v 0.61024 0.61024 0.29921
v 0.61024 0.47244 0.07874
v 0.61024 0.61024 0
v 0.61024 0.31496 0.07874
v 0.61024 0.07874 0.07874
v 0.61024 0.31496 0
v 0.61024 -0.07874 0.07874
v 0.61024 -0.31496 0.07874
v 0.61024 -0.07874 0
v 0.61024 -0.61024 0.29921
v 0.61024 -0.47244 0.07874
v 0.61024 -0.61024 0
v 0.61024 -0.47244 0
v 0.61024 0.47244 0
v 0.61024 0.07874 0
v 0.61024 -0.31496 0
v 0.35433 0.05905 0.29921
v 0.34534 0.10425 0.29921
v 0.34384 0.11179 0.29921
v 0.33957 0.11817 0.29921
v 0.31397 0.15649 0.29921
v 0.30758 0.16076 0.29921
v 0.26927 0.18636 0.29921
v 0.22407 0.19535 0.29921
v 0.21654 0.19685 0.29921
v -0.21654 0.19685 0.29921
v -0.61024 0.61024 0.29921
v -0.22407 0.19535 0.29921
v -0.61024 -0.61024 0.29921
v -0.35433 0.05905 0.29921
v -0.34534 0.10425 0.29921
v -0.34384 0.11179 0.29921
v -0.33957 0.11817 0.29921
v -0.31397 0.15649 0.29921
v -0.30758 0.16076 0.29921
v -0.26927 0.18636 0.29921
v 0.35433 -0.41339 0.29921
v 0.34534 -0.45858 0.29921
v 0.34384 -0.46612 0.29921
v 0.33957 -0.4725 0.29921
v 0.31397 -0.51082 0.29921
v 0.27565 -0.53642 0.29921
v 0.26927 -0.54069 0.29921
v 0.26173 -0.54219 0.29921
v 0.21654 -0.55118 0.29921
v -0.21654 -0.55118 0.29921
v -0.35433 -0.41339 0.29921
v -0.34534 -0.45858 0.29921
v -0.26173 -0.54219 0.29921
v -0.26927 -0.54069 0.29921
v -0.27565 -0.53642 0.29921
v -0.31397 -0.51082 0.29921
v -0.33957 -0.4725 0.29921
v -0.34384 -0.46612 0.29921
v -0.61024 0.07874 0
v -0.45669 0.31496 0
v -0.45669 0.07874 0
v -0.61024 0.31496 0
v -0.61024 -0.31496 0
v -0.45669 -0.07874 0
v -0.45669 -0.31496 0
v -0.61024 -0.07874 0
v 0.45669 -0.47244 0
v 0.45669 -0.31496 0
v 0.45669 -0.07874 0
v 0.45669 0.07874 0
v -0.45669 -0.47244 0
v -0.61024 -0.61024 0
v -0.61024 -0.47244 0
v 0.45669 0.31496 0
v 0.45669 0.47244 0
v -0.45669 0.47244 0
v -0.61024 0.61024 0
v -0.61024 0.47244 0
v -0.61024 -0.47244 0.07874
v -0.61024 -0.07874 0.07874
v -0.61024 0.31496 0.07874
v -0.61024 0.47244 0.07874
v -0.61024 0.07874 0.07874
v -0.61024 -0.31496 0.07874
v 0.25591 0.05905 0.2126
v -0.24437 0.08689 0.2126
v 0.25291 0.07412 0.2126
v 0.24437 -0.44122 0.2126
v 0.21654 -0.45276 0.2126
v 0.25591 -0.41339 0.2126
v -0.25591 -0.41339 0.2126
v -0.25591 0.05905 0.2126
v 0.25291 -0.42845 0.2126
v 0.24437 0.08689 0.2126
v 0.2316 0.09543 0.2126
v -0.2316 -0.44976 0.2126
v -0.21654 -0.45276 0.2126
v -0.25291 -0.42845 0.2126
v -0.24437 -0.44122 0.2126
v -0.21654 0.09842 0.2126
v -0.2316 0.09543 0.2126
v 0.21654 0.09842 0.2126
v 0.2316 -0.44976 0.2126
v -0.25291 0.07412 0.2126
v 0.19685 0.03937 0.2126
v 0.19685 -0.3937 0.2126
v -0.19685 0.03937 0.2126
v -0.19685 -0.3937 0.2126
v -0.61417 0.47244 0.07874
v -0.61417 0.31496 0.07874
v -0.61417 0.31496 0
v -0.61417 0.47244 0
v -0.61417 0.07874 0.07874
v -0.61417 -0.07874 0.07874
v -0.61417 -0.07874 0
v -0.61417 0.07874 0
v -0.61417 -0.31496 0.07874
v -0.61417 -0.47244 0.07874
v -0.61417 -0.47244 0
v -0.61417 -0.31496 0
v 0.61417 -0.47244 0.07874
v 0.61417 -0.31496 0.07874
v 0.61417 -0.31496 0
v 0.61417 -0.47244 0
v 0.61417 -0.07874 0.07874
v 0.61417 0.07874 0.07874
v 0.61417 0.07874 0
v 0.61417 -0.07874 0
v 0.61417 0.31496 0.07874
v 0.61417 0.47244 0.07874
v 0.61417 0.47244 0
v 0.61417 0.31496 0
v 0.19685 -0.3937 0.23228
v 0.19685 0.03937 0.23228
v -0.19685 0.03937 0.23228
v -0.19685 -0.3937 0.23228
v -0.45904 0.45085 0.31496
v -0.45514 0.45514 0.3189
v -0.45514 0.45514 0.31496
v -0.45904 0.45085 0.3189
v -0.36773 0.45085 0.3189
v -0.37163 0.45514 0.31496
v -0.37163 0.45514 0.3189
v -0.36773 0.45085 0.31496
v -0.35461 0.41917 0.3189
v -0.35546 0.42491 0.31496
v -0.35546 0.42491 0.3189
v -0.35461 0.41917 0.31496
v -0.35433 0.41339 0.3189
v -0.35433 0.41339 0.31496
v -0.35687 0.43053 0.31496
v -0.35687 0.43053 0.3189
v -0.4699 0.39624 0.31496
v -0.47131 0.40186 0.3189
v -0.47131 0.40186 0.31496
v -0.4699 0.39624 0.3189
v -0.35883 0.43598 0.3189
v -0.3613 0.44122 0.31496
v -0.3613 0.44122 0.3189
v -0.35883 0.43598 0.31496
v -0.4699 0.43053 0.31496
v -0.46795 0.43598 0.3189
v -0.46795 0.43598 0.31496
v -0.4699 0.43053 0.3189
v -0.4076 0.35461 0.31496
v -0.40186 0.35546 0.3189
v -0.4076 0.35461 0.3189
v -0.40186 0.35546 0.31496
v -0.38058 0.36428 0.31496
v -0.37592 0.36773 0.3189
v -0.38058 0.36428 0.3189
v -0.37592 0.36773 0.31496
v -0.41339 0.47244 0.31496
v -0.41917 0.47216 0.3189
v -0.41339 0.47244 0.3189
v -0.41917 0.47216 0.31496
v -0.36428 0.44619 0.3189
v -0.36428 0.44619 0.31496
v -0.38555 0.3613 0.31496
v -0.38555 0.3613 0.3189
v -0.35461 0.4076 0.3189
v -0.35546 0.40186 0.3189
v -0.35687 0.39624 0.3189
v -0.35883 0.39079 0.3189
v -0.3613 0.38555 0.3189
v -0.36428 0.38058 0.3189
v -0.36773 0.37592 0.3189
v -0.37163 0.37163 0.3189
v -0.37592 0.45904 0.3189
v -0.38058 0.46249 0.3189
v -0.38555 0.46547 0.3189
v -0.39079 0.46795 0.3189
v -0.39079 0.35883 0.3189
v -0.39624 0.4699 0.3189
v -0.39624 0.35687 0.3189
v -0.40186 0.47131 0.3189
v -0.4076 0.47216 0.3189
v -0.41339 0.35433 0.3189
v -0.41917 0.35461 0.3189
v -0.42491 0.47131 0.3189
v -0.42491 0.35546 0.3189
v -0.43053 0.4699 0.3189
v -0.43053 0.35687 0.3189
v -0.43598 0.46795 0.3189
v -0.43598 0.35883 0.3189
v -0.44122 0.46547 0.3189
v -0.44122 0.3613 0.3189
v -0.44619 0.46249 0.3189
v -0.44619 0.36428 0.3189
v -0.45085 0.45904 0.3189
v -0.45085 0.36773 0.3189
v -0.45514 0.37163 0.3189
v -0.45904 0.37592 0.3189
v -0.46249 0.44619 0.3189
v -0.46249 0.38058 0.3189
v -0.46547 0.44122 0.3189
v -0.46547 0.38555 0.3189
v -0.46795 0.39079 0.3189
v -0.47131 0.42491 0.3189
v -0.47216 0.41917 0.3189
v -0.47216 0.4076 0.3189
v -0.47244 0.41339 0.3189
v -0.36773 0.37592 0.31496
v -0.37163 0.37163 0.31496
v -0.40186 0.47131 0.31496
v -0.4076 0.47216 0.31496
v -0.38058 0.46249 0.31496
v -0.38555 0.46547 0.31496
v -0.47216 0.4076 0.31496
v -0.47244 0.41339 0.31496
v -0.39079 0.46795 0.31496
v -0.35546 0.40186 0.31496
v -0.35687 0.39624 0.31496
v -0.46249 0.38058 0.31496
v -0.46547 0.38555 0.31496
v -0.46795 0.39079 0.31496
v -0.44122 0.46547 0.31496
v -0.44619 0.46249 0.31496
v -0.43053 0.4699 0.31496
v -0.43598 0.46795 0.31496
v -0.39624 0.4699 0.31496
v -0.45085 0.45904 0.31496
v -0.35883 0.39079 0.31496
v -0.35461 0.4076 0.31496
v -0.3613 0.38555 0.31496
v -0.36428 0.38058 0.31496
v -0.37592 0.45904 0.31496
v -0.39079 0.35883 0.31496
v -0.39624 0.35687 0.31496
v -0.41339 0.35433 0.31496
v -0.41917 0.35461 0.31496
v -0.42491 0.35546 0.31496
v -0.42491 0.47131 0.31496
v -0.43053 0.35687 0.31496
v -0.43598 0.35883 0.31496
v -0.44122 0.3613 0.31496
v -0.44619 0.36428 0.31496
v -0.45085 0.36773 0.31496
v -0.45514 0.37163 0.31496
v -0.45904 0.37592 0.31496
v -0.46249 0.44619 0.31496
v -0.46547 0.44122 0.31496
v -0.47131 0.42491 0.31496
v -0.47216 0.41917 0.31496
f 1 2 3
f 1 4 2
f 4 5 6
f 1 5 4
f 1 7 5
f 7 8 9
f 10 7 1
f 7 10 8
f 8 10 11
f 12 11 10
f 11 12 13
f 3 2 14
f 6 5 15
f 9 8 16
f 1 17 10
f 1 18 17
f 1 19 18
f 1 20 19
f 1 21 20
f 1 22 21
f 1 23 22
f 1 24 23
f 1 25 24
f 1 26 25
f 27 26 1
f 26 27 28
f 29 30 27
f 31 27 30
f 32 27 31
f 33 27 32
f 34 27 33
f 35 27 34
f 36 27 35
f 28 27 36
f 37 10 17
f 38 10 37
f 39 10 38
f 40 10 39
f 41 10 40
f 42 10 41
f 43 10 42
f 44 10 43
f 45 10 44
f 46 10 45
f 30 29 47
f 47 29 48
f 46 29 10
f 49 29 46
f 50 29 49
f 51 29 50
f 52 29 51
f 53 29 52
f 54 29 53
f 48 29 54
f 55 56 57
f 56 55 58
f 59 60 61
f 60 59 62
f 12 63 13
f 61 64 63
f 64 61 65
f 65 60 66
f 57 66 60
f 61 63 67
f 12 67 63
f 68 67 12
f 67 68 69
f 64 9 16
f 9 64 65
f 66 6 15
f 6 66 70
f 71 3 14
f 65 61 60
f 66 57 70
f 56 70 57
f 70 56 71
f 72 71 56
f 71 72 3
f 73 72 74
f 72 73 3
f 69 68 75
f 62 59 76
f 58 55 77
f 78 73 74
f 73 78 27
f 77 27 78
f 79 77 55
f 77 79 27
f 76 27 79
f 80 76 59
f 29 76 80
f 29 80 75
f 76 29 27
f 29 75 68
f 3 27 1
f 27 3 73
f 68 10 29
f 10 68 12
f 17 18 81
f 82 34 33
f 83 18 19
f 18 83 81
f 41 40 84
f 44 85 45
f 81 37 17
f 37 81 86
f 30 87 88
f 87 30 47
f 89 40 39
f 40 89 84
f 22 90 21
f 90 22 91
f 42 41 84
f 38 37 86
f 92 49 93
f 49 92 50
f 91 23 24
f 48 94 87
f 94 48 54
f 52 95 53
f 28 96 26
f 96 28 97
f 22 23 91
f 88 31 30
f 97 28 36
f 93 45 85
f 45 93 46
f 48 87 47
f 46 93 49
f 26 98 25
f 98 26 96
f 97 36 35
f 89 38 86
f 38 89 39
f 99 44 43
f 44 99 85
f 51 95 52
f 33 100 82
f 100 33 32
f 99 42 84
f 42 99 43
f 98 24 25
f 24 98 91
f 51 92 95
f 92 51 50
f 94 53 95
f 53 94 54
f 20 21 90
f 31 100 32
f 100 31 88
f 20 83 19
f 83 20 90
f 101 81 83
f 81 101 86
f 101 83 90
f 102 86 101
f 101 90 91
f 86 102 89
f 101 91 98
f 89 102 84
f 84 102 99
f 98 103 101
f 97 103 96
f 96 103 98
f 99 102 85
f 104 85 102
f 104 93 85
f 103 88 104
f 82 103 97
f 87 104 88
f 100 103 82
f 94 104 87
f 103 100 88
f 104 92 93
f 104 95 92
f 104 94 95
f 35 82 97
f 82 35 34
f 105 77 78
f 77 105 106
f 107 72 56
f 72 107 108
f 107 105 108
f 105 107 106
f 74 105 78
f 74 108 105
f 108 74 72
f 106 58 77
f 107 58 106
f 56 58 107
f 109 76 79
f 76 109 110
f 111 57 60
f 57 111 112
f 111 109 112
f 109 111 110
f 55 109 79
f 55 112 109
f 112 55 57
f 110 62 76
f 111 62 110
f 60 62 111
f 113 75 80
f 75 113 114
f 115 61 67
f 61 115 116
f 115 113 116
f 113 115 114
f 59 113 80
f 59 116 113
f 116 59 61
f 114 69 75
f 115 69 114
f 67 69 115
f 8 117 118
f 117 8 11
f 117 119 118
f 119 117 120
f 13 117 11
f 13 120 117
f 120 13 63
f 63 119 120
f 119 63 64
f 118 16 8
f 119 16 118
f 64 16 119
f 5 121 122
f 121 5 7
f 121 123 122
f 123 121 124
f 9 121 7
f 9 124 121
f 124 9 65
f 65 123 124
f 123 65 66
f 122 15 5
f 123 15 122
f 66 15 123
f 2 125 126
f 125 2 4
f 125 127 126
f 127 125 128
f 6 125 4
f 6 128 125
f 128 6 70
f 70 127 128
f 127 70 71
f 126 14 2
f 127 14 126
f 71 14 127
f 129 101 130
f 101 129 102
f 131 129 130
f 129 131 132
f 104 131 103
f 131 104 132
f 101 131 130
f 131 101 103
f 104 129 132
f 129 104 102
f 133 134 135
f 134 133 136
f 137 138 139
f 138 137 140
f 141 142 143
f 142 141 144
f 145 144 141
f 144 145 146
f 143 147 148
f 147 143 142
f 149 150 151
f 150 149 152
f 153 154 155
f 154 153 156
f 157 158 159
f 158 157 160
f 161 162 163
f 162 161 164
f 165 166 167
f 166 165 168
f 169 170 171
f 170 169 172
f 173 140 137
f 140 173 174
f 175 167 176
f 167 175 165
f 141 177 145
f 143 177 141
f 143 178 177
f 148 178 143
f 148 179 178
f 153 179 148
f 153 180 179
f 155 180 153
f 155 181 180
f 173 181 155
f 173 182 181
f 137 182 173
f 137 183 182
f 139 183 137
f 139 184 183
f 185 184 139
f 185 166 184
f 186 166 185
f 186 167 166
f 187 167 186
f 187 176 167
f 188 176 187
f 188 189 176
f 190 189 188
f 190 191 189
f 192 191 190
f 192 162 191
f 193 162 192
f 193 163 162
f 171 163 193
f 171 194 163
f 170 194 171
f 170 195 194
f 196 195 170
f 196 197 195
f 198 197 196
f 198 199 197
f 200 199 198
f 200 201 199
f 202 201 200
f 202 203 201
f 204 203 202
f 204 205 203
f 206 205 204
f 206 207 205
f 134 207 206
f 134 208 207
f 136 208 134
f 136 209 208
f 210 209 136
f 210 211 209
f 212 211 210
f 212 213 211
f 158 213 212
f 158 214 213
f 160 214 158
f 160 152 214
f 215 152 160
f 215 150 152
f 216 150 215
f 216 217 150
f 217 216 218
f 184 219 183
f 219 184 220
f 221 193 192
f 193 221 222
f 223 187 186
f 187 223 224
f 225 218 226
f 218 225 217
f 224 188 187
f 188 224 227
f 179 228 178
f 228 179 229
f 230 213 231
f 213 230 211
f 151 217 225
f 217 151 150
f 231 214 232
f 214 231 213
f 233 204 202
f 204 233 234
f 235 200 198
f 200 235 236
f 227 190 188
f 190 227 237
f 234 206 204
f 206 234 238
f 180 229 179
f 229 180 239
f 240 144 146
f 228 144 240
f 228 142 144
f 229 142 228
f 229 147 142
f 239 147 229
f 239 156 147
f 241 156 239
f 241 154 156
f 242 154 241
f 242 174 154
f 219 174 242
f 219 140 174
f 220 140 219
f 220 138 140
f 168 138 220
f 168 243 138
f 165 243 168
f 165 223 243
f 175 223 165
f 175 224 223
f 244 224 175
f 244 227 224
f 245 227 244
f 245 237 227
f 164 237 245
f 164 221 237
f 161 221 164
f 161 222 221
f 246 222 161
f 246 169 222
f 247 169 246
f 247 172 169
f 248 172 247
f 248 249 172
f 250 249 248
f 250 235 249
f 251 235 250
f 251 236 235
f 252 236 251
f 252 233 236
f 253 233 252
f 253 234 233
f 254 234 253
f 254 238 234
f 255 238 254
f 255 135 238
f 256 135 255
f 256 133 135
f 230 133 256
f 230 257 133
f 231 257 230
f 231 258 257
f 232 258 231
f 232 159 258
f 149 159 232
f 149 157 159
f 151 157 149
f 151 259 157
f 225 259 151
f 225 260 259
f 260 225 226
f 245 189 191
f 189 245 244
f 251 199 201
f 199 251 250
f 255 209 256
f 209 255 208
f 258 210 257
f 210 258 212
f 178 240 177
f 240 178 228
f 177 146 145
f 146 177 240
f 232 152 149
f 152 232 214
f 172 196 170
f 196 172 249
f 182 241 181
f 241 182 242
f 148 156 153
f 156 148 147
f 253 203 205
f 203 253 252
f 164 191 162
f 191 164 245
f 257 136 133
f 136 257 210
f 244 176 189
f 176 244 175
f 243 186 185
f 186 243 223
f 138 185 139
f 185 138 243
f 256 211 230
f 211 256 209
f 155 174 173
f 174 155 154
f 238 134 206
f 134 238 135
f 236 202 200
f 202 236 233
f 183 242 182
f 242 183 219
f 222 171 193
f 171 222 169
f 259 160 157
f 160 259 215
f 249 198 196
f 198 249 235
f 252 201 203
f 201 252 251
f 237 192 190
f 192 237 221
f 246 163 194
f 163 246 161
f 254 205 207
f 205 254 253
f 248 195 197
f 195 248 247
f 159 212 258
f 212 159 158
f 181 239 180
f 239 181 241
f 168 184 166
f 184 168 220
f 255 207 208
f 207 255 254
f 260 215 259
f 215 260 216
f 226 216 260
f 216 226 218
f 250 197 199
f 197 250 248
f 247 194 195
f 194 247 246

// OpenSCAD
// file: defines.scad
L = 3.1;  // Длина
W = 3.1;  // Ширина
H = 0.8;  // Высота (от платы, с выводами)
Hf = 0.04;  // Возвышение над платой (высота выводов)
e = 0.5;    // Шаг выводов

pin_fragments = 16;

scale = 1/2.54;
// file: HDC1080DM-pins.scad
include <defines.scad>

p_w = 0.567;
p_h = 0.4;

p_co = 1.55 - 3*p_h/2 + 0.02;

module Pin(x, y, z, r) {
color("Gold")
  rotate([0,0,r]) translate([x,y,z])
  union() {
    /*Упрощенный вид ног*/
    /*cube(size = [p_w, p_h, Hf],center=true);*/
    /*Оригинальная форма*/
    /*translate([-0.04,0,0.0]) cube(size = [0.4, 0.3, Hf], center=true);
    translate([ 0.14,0,0.0]) cylinder(r = p_h/2, h = Hf, $fn = 64, center=true);
    translate([-0.23,0.1,0.0]) cylinder(r = 0.05, h = Hf, $fn = 64, center=true);
    translate([-0.23,-0.1,0.0]) cylinder(r = 0.05, h = Hf, $fn = 64, center=true);
    translate([-0.23,0,0]) cube(size = [0.1, 0.2, Hf],center=true);*/

    translate([-0.39, 0, 0.1]) cube(size = [p_h, p_h, 0.2],center=true); // На боковине
  }
}

scale(scale)
  union() {
    Pin(-p_co, 1.0, 0, 0); // #1
    Pin(-p_co, 0.0, 0, 0); // #2
    Pin(-p_co,-1.0, 0, 0); // #3

    /*Pin(-p_co, 0.5, 0, 90); // #6
    Pin(-p_co, 0.0, 0, 90); // #7
    Pin(-p_co,-0.5, 0, 90); // #8*/

    Pin(-p_co, 1.0, 0, 180); // #4
    Pin(-p_co, 0.0, 0, 180); // #5
    Pin(-p_co,-1.0, 0, 180); // #6

    /*Pin(-p_co, 0.5, 0, 270); // #14
    Pin(-p_co, 0.0, 0, 270); // #15
    Pin(-p_co,-0.5, 0, 270); // #16*/

  };
// file: HDC1080DM-label.scad
include <defines.scad>

font = "Liberation Sans";
/*font = "DejaVu";*/
/*font = "Abyssinica SIL";*/

f_x = -0.8;
f_y = 1.5;
f_dy = -0.4;
fscale = 0.03;
lab_h = 0.01;

// Label
scale(scale) color("White") {

    /*translate([f_x, f_y+f_dy, H]) {
        scale([fscale,fscale,1])
        linear_extrude(height = lab_h, center=false) {
            text("Texas", font = font);
        }
    }
    translate([f_x, f_y+2*f_dy, H]) {
        scale([fscale,fscale,1])
        linear_extrude(height = lab_h, center=false) {
            text("Instruments", font = font);
        }
    }*/

    translate([-1.05, 1.05, H]) {
        cylinder(r = 0.15, h = lab_h, $fn = 64);
    }

}
// file: HDC1080DM-frame.scad
include <defines.scad>

scale(scale)
  color([1.0, 0.6, 0.0])
    translate([0, 0, (H - Hf)/2]) {
      translate([0,-0.45, (H - Hf)/2 - 0.22]) cube([1.0, 1.1, 0.1], center = true);
    }
// file: HDC1080DM-body.scad
include <defines.scad>

ox = 1.1/2;
oy = 1.2/2;

scale(scale)
  color([0.15,0.15,0.15])
    translate([0, 0, (H - Hf)/2]) {
      difference() {
        cube([L, W, H - Hf], center = true);
        /*%translate([0.45, 0, (H - Hf)/2]) cube([1.2, 1.3, 0.44], center = true);*/
        translate([0.0,-0.45, (H - Hf)/2]) {
          hull(){
            translate([ ox, oy, 0]) cylinder(r1=0.1, r2=0.6, h=0.44, $fn=16, center=true);
            translate([-ox, oy, 0]) cylinder(r1=0.1, r2=0.6, h=0.44, $fn=16, center=true);
            translate([ ox,-oy, 0]) cylinder(r1=0.1, r2=0.6, h=0.44, $fn=16, center=true);
            translate([-ox,-oy, 0]) cylinder(r1=0.1, r2=0.6, h=0.44, $fn=16, center=true);
          }
        }
      }

        /*%translate([0.45, 0, (H - Hf)/2 - 0.44]) square(size=[1.2, 1.3], center=true);*/

    }
// main file
include <HDC1080DM-body.scad>
include <HDC1080DM-frame.scad>
include <HDC1080DM-label.scad>
include <HDC1080DM-pins.scad>
